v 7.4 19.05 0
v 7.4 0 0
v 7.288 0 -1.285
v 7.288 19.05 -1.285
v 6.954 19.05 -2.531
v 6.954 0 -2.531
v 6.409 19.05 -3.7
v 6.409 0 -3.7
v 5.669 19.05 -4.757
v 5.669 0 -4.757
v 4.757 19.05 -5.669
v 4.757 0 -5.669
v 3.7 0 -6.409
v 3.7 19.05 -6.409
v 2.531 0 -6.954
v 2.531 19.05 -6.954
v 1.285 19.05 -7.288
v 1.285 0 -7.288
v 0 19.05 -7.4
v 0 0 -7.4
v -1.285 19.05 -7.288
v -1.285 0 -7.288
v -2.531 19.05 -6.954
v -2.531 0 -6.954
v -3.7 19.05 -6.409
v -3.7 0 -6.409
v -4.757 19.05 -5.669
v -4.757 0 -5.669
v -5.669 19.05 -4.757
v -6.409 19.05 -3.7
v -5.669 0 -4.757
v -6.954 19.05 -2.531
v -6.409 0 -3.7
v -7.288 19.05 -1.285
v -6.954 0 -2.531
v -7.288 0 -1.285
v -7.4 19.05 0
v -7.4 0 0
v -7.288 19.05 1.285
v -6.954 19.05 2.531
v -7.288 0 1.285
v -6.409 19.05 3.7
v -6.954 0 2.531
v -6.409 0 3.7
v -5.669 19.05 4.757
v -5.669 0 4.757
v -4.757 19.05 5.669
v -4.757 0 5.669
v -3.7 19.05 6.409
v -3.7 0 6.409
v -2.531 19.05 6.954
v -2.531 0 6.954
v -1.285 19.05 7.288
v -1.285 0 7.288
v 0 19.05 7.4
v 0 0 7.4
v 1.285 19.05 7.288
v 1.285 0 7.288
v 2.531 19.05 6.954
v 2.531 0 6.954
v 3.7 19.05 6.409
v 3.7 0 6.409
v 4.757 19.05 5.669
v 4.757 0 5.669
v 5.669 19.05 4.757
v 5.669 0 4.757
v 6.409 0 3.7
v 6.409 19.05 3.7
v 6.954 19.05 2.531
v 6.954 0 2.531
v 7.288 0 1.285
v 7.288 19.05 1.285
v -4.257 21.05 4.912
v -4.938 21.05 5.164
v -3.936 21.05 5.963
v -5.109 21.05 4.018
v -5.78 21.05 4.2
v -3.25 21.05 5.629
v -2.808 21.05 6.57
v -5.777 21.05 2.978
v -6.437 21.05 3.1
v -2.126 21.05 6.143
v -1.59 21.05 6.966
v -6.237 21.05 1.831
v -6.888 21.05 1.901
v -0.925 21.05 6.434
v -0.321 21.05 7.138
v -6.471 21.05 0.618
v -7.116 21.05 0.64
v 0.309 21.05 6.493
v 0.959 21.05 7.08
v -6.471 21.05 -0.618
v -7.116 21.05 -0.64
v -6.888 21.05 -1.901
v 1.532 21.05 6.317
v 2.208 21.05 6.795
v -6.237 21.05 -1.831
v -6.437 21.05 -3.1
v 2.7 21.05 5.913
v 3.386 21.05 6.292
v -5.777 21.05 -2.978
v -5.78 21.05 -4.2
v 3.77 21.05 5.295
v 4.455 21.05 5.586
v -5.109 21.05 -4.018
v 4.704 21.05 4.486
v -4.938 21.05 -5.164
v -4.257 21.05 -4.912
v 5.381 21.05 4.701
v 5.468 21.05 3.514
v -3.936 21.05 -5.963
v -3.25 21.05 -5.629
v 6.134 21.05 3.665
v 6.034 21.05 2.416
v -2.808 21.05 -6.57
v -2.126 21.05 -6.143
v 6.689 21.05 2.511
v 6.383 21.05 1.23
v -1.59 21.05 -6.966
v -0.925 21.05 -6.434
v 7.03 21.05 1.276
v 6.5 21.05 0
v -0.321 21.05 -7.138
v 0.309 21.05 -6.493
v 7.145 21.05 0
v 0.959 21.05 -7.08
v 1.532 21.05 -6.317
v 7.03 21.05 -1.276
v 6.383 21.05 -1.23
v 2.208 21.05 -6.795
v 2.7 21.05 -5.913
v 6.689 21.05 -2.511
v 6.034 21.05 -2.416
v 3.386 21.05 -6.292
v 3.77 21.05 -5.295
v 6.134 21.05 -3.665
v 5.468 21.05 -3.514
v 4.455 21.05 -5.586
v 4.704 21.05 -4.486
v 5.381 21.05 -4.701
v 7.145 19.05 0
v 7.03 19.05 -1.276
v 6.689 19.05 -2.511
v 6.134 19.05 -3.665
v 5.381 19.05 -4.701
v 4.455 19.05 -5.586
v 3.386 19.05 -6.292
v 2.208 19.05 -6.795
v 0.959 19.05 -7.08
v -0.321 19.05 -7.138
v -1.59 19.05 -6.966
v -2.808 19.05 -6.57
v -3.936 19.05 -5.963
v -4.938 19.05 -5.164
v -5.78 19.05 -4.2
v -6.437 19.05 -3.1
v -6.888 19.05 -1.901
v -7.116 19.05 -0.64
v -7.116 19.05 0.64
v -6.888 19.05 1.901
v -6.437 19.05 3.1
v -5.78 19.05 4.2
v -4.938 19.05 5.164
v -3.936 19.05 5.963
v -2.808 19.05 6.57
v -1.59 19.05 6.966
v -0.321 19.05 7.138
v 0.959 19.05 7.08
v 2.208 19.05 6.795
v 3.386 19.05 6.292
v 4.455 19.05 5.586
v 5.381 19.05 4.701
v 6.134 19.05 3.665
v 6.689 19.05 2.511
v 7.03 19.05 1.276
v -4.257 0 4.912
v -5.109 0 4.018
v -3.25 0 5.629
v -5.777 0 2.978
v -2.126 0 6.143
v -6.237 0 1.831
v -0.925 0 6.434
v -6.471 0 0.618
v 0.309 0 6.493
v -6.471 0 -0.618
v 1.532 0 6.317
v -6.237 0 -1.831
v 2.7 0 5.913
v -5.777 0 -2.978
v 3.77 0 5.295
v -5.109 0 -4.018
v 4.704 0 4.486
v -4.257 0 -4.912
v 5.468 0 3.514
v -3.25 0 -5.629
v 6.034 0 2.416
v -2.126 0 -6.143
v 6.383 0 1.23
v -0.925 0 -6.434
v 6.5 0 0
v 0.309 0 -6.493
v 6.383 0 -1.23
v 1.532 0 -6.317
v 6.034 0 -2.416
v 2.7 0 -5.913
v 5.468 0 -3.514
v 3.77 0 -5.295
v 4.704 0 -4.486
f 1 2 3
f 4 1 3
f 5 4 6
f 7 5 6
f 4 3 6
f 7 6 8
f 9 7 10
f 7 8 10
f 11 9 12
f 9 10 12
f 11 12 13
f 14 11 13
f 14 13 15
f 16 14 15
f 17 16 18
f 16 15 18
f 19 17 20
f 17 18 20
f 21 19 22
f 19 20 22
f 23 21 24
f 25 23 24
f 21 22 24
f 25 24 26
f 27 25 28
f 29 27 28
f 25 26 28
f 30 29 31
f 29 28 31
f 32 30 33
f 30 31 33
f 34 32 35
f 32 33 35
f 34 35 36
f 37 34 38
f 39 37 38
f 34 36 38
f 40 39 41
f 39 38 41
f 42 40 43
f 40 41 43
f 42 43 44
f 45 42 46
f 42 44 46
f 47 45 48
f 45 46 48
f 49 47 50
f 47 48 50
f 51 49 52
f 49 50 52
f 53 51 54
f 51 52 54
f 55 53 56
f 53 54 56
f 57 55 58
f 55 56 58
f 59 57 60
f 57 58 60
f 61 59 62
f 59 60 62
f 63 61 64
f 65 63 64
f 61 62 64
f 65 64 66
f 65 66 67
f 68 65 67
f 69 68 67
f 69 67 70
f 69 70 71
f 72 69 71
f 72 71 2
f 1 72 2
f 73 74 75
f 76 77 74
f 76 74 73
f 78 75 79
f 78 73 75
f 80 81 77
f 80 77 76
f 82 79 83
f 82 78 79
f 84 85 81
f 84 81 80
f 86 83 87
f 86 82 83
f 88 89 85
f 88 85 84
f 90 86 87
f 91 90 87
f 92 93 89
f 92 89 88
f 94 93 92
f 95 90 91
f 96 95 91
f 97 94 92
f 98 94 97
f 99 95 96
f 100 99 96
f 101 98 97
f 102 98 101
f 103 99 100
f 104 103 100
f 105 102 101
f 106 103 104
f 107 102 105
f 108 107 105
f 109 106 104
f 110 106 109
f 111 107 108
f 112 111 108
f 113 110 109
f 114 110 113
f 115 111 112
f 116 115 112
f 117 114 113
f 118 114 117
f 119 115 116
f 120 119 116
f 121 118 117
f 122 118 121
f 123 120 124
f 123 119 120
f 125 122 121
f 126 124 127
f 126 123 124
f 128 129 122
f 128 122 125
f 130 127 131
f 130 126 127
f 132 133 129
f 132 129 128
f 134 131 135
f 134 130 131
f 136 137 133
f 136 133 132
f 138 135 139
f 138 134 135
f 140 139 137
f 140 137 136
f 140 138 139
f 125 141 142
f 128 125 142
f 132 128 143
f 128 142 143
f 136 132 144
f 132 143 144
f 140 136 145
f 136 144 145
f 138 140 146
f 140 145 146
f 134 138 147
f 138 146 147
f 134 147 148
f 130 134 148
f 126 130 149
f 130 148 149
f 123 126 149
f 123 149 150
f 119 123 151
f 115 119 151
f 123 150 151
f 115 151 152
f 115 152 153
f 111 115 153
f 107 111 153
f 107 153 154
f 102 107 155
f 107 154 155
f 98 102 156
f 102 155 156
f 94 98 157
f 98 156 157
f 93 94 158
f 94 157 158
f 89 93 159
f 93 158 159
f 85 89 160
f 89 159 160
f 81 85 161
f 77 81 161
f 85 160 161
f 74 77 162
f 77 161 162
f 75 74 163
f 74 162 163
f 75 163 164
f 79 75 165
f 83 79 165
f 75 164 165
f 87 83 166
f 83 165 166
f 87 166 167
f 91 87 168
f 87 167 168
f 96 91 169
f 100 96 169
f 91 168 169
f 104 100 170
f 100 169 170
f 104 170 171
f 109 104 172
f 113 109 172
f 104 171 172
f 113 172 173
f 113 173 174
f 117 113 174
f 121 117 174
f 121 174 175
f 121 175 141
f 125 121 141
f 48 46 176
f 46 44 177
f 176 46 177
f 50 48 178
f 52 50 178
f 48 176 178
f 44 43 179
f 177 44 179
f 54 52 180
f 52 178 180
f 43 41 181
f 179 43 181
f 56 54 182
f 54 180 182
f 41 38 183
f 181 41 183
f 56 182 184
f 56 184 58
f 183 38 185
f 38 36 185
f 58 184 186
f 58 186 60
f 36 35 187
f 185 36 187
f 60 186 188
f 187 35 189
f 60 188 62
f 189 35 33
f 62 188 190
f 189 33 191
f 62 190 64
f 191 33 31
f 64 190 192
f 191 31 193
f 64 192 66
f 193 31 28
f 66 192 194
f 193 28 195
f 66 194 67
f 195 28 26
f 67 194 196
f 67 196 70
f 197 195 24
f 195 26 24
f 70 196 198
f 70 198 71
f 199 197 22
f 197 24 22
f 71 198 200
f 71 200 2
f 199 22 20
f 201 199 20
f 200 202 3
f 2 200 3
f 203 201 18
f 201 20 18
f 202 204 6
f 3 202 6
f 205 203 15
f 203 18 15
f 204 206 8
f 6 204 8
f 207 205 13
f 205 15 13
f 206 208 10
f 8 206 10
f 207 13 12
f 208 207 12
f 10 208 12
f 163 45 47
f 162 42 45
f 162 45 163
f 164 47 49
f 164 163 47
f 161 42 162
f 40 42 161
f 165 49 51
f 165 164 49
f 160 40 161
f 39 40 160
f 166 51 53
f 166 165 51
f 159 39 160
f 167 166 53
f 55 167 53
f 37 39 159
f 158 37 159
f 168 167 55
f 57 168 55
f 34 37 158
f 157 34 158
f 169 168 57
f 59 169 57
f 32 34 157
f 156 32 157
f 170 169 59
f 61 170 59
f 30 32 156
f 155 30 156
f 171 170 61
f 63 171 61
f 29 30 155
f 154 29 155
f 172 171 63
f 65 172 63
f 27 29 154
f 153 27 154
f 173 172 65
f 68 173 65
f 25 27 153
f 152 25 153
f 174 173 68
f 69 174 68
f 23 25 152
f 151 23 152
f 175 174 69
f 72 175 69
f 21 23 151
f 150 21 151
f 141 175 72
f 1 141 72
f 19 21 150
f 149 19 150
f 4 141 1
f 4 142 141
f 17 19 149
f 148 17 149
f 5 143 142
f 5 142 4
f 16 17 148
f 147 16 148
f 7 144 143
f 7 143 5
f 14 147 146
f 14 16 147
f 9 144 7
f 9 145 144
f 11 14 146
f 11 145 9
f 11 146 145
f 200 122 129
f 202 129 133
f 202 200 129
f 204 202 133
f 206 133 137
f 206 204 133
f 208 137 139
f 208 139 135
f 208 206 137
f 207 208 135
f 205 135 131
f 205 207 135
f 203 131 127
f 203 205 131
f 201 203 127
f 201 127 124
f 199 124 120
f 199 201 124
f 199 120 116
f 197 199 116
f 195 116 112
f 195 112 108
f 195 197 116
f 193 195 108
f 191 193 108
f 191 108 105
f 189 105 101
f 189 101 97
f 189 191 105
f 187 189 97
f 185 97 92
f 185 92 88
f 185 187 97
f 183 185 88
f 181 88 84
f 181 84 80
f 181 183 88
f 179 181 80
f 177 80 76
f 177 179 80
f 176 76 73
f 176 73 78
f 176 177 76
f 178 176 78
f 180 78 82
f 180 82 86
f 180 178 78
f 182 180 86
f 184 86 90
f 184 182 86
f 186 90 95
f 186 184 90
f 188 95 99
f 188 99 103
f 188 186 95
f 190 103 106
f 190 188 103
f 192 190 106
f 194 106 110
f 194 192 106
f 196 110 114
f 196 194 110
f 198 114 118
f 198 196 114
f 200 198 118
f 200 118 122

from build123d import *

# Parameters (mm, degrees)
F0_R     = 7.4
F0_R_2   = 6.5
F1_DEPTH = 19.05
F2_R     = 7.145
F2_R_2   = 6.5
F3_DEPTH = 2
F5_ANGLE = -90


with BuildPart() as f1:
    # F0 (on Top) → F1 (new body)
    with BuildSketch(Plane.XY):
        Circle(F0_R)
        Circle(F0_R_2, mode=Mode.SUBTRACT)
    extrude(amount=F1_DEPTH)

    # F2 (on face) → F3 (join)
    with BuildSketch(Plane.XY.offset(19.05)):
        Circle(F2_R)
        Circle(F2_R_2, mode=Mode.SUBTRACT)
    extrude(amount=F3_DEPTH)


with BuildPart() as f1_1:
    # F5: moved
    add(f1.part.rotate(Axis((5.261217, 0, 0), (1, 0, 0)), F5_ANGLE))


solid = f1_1.part
